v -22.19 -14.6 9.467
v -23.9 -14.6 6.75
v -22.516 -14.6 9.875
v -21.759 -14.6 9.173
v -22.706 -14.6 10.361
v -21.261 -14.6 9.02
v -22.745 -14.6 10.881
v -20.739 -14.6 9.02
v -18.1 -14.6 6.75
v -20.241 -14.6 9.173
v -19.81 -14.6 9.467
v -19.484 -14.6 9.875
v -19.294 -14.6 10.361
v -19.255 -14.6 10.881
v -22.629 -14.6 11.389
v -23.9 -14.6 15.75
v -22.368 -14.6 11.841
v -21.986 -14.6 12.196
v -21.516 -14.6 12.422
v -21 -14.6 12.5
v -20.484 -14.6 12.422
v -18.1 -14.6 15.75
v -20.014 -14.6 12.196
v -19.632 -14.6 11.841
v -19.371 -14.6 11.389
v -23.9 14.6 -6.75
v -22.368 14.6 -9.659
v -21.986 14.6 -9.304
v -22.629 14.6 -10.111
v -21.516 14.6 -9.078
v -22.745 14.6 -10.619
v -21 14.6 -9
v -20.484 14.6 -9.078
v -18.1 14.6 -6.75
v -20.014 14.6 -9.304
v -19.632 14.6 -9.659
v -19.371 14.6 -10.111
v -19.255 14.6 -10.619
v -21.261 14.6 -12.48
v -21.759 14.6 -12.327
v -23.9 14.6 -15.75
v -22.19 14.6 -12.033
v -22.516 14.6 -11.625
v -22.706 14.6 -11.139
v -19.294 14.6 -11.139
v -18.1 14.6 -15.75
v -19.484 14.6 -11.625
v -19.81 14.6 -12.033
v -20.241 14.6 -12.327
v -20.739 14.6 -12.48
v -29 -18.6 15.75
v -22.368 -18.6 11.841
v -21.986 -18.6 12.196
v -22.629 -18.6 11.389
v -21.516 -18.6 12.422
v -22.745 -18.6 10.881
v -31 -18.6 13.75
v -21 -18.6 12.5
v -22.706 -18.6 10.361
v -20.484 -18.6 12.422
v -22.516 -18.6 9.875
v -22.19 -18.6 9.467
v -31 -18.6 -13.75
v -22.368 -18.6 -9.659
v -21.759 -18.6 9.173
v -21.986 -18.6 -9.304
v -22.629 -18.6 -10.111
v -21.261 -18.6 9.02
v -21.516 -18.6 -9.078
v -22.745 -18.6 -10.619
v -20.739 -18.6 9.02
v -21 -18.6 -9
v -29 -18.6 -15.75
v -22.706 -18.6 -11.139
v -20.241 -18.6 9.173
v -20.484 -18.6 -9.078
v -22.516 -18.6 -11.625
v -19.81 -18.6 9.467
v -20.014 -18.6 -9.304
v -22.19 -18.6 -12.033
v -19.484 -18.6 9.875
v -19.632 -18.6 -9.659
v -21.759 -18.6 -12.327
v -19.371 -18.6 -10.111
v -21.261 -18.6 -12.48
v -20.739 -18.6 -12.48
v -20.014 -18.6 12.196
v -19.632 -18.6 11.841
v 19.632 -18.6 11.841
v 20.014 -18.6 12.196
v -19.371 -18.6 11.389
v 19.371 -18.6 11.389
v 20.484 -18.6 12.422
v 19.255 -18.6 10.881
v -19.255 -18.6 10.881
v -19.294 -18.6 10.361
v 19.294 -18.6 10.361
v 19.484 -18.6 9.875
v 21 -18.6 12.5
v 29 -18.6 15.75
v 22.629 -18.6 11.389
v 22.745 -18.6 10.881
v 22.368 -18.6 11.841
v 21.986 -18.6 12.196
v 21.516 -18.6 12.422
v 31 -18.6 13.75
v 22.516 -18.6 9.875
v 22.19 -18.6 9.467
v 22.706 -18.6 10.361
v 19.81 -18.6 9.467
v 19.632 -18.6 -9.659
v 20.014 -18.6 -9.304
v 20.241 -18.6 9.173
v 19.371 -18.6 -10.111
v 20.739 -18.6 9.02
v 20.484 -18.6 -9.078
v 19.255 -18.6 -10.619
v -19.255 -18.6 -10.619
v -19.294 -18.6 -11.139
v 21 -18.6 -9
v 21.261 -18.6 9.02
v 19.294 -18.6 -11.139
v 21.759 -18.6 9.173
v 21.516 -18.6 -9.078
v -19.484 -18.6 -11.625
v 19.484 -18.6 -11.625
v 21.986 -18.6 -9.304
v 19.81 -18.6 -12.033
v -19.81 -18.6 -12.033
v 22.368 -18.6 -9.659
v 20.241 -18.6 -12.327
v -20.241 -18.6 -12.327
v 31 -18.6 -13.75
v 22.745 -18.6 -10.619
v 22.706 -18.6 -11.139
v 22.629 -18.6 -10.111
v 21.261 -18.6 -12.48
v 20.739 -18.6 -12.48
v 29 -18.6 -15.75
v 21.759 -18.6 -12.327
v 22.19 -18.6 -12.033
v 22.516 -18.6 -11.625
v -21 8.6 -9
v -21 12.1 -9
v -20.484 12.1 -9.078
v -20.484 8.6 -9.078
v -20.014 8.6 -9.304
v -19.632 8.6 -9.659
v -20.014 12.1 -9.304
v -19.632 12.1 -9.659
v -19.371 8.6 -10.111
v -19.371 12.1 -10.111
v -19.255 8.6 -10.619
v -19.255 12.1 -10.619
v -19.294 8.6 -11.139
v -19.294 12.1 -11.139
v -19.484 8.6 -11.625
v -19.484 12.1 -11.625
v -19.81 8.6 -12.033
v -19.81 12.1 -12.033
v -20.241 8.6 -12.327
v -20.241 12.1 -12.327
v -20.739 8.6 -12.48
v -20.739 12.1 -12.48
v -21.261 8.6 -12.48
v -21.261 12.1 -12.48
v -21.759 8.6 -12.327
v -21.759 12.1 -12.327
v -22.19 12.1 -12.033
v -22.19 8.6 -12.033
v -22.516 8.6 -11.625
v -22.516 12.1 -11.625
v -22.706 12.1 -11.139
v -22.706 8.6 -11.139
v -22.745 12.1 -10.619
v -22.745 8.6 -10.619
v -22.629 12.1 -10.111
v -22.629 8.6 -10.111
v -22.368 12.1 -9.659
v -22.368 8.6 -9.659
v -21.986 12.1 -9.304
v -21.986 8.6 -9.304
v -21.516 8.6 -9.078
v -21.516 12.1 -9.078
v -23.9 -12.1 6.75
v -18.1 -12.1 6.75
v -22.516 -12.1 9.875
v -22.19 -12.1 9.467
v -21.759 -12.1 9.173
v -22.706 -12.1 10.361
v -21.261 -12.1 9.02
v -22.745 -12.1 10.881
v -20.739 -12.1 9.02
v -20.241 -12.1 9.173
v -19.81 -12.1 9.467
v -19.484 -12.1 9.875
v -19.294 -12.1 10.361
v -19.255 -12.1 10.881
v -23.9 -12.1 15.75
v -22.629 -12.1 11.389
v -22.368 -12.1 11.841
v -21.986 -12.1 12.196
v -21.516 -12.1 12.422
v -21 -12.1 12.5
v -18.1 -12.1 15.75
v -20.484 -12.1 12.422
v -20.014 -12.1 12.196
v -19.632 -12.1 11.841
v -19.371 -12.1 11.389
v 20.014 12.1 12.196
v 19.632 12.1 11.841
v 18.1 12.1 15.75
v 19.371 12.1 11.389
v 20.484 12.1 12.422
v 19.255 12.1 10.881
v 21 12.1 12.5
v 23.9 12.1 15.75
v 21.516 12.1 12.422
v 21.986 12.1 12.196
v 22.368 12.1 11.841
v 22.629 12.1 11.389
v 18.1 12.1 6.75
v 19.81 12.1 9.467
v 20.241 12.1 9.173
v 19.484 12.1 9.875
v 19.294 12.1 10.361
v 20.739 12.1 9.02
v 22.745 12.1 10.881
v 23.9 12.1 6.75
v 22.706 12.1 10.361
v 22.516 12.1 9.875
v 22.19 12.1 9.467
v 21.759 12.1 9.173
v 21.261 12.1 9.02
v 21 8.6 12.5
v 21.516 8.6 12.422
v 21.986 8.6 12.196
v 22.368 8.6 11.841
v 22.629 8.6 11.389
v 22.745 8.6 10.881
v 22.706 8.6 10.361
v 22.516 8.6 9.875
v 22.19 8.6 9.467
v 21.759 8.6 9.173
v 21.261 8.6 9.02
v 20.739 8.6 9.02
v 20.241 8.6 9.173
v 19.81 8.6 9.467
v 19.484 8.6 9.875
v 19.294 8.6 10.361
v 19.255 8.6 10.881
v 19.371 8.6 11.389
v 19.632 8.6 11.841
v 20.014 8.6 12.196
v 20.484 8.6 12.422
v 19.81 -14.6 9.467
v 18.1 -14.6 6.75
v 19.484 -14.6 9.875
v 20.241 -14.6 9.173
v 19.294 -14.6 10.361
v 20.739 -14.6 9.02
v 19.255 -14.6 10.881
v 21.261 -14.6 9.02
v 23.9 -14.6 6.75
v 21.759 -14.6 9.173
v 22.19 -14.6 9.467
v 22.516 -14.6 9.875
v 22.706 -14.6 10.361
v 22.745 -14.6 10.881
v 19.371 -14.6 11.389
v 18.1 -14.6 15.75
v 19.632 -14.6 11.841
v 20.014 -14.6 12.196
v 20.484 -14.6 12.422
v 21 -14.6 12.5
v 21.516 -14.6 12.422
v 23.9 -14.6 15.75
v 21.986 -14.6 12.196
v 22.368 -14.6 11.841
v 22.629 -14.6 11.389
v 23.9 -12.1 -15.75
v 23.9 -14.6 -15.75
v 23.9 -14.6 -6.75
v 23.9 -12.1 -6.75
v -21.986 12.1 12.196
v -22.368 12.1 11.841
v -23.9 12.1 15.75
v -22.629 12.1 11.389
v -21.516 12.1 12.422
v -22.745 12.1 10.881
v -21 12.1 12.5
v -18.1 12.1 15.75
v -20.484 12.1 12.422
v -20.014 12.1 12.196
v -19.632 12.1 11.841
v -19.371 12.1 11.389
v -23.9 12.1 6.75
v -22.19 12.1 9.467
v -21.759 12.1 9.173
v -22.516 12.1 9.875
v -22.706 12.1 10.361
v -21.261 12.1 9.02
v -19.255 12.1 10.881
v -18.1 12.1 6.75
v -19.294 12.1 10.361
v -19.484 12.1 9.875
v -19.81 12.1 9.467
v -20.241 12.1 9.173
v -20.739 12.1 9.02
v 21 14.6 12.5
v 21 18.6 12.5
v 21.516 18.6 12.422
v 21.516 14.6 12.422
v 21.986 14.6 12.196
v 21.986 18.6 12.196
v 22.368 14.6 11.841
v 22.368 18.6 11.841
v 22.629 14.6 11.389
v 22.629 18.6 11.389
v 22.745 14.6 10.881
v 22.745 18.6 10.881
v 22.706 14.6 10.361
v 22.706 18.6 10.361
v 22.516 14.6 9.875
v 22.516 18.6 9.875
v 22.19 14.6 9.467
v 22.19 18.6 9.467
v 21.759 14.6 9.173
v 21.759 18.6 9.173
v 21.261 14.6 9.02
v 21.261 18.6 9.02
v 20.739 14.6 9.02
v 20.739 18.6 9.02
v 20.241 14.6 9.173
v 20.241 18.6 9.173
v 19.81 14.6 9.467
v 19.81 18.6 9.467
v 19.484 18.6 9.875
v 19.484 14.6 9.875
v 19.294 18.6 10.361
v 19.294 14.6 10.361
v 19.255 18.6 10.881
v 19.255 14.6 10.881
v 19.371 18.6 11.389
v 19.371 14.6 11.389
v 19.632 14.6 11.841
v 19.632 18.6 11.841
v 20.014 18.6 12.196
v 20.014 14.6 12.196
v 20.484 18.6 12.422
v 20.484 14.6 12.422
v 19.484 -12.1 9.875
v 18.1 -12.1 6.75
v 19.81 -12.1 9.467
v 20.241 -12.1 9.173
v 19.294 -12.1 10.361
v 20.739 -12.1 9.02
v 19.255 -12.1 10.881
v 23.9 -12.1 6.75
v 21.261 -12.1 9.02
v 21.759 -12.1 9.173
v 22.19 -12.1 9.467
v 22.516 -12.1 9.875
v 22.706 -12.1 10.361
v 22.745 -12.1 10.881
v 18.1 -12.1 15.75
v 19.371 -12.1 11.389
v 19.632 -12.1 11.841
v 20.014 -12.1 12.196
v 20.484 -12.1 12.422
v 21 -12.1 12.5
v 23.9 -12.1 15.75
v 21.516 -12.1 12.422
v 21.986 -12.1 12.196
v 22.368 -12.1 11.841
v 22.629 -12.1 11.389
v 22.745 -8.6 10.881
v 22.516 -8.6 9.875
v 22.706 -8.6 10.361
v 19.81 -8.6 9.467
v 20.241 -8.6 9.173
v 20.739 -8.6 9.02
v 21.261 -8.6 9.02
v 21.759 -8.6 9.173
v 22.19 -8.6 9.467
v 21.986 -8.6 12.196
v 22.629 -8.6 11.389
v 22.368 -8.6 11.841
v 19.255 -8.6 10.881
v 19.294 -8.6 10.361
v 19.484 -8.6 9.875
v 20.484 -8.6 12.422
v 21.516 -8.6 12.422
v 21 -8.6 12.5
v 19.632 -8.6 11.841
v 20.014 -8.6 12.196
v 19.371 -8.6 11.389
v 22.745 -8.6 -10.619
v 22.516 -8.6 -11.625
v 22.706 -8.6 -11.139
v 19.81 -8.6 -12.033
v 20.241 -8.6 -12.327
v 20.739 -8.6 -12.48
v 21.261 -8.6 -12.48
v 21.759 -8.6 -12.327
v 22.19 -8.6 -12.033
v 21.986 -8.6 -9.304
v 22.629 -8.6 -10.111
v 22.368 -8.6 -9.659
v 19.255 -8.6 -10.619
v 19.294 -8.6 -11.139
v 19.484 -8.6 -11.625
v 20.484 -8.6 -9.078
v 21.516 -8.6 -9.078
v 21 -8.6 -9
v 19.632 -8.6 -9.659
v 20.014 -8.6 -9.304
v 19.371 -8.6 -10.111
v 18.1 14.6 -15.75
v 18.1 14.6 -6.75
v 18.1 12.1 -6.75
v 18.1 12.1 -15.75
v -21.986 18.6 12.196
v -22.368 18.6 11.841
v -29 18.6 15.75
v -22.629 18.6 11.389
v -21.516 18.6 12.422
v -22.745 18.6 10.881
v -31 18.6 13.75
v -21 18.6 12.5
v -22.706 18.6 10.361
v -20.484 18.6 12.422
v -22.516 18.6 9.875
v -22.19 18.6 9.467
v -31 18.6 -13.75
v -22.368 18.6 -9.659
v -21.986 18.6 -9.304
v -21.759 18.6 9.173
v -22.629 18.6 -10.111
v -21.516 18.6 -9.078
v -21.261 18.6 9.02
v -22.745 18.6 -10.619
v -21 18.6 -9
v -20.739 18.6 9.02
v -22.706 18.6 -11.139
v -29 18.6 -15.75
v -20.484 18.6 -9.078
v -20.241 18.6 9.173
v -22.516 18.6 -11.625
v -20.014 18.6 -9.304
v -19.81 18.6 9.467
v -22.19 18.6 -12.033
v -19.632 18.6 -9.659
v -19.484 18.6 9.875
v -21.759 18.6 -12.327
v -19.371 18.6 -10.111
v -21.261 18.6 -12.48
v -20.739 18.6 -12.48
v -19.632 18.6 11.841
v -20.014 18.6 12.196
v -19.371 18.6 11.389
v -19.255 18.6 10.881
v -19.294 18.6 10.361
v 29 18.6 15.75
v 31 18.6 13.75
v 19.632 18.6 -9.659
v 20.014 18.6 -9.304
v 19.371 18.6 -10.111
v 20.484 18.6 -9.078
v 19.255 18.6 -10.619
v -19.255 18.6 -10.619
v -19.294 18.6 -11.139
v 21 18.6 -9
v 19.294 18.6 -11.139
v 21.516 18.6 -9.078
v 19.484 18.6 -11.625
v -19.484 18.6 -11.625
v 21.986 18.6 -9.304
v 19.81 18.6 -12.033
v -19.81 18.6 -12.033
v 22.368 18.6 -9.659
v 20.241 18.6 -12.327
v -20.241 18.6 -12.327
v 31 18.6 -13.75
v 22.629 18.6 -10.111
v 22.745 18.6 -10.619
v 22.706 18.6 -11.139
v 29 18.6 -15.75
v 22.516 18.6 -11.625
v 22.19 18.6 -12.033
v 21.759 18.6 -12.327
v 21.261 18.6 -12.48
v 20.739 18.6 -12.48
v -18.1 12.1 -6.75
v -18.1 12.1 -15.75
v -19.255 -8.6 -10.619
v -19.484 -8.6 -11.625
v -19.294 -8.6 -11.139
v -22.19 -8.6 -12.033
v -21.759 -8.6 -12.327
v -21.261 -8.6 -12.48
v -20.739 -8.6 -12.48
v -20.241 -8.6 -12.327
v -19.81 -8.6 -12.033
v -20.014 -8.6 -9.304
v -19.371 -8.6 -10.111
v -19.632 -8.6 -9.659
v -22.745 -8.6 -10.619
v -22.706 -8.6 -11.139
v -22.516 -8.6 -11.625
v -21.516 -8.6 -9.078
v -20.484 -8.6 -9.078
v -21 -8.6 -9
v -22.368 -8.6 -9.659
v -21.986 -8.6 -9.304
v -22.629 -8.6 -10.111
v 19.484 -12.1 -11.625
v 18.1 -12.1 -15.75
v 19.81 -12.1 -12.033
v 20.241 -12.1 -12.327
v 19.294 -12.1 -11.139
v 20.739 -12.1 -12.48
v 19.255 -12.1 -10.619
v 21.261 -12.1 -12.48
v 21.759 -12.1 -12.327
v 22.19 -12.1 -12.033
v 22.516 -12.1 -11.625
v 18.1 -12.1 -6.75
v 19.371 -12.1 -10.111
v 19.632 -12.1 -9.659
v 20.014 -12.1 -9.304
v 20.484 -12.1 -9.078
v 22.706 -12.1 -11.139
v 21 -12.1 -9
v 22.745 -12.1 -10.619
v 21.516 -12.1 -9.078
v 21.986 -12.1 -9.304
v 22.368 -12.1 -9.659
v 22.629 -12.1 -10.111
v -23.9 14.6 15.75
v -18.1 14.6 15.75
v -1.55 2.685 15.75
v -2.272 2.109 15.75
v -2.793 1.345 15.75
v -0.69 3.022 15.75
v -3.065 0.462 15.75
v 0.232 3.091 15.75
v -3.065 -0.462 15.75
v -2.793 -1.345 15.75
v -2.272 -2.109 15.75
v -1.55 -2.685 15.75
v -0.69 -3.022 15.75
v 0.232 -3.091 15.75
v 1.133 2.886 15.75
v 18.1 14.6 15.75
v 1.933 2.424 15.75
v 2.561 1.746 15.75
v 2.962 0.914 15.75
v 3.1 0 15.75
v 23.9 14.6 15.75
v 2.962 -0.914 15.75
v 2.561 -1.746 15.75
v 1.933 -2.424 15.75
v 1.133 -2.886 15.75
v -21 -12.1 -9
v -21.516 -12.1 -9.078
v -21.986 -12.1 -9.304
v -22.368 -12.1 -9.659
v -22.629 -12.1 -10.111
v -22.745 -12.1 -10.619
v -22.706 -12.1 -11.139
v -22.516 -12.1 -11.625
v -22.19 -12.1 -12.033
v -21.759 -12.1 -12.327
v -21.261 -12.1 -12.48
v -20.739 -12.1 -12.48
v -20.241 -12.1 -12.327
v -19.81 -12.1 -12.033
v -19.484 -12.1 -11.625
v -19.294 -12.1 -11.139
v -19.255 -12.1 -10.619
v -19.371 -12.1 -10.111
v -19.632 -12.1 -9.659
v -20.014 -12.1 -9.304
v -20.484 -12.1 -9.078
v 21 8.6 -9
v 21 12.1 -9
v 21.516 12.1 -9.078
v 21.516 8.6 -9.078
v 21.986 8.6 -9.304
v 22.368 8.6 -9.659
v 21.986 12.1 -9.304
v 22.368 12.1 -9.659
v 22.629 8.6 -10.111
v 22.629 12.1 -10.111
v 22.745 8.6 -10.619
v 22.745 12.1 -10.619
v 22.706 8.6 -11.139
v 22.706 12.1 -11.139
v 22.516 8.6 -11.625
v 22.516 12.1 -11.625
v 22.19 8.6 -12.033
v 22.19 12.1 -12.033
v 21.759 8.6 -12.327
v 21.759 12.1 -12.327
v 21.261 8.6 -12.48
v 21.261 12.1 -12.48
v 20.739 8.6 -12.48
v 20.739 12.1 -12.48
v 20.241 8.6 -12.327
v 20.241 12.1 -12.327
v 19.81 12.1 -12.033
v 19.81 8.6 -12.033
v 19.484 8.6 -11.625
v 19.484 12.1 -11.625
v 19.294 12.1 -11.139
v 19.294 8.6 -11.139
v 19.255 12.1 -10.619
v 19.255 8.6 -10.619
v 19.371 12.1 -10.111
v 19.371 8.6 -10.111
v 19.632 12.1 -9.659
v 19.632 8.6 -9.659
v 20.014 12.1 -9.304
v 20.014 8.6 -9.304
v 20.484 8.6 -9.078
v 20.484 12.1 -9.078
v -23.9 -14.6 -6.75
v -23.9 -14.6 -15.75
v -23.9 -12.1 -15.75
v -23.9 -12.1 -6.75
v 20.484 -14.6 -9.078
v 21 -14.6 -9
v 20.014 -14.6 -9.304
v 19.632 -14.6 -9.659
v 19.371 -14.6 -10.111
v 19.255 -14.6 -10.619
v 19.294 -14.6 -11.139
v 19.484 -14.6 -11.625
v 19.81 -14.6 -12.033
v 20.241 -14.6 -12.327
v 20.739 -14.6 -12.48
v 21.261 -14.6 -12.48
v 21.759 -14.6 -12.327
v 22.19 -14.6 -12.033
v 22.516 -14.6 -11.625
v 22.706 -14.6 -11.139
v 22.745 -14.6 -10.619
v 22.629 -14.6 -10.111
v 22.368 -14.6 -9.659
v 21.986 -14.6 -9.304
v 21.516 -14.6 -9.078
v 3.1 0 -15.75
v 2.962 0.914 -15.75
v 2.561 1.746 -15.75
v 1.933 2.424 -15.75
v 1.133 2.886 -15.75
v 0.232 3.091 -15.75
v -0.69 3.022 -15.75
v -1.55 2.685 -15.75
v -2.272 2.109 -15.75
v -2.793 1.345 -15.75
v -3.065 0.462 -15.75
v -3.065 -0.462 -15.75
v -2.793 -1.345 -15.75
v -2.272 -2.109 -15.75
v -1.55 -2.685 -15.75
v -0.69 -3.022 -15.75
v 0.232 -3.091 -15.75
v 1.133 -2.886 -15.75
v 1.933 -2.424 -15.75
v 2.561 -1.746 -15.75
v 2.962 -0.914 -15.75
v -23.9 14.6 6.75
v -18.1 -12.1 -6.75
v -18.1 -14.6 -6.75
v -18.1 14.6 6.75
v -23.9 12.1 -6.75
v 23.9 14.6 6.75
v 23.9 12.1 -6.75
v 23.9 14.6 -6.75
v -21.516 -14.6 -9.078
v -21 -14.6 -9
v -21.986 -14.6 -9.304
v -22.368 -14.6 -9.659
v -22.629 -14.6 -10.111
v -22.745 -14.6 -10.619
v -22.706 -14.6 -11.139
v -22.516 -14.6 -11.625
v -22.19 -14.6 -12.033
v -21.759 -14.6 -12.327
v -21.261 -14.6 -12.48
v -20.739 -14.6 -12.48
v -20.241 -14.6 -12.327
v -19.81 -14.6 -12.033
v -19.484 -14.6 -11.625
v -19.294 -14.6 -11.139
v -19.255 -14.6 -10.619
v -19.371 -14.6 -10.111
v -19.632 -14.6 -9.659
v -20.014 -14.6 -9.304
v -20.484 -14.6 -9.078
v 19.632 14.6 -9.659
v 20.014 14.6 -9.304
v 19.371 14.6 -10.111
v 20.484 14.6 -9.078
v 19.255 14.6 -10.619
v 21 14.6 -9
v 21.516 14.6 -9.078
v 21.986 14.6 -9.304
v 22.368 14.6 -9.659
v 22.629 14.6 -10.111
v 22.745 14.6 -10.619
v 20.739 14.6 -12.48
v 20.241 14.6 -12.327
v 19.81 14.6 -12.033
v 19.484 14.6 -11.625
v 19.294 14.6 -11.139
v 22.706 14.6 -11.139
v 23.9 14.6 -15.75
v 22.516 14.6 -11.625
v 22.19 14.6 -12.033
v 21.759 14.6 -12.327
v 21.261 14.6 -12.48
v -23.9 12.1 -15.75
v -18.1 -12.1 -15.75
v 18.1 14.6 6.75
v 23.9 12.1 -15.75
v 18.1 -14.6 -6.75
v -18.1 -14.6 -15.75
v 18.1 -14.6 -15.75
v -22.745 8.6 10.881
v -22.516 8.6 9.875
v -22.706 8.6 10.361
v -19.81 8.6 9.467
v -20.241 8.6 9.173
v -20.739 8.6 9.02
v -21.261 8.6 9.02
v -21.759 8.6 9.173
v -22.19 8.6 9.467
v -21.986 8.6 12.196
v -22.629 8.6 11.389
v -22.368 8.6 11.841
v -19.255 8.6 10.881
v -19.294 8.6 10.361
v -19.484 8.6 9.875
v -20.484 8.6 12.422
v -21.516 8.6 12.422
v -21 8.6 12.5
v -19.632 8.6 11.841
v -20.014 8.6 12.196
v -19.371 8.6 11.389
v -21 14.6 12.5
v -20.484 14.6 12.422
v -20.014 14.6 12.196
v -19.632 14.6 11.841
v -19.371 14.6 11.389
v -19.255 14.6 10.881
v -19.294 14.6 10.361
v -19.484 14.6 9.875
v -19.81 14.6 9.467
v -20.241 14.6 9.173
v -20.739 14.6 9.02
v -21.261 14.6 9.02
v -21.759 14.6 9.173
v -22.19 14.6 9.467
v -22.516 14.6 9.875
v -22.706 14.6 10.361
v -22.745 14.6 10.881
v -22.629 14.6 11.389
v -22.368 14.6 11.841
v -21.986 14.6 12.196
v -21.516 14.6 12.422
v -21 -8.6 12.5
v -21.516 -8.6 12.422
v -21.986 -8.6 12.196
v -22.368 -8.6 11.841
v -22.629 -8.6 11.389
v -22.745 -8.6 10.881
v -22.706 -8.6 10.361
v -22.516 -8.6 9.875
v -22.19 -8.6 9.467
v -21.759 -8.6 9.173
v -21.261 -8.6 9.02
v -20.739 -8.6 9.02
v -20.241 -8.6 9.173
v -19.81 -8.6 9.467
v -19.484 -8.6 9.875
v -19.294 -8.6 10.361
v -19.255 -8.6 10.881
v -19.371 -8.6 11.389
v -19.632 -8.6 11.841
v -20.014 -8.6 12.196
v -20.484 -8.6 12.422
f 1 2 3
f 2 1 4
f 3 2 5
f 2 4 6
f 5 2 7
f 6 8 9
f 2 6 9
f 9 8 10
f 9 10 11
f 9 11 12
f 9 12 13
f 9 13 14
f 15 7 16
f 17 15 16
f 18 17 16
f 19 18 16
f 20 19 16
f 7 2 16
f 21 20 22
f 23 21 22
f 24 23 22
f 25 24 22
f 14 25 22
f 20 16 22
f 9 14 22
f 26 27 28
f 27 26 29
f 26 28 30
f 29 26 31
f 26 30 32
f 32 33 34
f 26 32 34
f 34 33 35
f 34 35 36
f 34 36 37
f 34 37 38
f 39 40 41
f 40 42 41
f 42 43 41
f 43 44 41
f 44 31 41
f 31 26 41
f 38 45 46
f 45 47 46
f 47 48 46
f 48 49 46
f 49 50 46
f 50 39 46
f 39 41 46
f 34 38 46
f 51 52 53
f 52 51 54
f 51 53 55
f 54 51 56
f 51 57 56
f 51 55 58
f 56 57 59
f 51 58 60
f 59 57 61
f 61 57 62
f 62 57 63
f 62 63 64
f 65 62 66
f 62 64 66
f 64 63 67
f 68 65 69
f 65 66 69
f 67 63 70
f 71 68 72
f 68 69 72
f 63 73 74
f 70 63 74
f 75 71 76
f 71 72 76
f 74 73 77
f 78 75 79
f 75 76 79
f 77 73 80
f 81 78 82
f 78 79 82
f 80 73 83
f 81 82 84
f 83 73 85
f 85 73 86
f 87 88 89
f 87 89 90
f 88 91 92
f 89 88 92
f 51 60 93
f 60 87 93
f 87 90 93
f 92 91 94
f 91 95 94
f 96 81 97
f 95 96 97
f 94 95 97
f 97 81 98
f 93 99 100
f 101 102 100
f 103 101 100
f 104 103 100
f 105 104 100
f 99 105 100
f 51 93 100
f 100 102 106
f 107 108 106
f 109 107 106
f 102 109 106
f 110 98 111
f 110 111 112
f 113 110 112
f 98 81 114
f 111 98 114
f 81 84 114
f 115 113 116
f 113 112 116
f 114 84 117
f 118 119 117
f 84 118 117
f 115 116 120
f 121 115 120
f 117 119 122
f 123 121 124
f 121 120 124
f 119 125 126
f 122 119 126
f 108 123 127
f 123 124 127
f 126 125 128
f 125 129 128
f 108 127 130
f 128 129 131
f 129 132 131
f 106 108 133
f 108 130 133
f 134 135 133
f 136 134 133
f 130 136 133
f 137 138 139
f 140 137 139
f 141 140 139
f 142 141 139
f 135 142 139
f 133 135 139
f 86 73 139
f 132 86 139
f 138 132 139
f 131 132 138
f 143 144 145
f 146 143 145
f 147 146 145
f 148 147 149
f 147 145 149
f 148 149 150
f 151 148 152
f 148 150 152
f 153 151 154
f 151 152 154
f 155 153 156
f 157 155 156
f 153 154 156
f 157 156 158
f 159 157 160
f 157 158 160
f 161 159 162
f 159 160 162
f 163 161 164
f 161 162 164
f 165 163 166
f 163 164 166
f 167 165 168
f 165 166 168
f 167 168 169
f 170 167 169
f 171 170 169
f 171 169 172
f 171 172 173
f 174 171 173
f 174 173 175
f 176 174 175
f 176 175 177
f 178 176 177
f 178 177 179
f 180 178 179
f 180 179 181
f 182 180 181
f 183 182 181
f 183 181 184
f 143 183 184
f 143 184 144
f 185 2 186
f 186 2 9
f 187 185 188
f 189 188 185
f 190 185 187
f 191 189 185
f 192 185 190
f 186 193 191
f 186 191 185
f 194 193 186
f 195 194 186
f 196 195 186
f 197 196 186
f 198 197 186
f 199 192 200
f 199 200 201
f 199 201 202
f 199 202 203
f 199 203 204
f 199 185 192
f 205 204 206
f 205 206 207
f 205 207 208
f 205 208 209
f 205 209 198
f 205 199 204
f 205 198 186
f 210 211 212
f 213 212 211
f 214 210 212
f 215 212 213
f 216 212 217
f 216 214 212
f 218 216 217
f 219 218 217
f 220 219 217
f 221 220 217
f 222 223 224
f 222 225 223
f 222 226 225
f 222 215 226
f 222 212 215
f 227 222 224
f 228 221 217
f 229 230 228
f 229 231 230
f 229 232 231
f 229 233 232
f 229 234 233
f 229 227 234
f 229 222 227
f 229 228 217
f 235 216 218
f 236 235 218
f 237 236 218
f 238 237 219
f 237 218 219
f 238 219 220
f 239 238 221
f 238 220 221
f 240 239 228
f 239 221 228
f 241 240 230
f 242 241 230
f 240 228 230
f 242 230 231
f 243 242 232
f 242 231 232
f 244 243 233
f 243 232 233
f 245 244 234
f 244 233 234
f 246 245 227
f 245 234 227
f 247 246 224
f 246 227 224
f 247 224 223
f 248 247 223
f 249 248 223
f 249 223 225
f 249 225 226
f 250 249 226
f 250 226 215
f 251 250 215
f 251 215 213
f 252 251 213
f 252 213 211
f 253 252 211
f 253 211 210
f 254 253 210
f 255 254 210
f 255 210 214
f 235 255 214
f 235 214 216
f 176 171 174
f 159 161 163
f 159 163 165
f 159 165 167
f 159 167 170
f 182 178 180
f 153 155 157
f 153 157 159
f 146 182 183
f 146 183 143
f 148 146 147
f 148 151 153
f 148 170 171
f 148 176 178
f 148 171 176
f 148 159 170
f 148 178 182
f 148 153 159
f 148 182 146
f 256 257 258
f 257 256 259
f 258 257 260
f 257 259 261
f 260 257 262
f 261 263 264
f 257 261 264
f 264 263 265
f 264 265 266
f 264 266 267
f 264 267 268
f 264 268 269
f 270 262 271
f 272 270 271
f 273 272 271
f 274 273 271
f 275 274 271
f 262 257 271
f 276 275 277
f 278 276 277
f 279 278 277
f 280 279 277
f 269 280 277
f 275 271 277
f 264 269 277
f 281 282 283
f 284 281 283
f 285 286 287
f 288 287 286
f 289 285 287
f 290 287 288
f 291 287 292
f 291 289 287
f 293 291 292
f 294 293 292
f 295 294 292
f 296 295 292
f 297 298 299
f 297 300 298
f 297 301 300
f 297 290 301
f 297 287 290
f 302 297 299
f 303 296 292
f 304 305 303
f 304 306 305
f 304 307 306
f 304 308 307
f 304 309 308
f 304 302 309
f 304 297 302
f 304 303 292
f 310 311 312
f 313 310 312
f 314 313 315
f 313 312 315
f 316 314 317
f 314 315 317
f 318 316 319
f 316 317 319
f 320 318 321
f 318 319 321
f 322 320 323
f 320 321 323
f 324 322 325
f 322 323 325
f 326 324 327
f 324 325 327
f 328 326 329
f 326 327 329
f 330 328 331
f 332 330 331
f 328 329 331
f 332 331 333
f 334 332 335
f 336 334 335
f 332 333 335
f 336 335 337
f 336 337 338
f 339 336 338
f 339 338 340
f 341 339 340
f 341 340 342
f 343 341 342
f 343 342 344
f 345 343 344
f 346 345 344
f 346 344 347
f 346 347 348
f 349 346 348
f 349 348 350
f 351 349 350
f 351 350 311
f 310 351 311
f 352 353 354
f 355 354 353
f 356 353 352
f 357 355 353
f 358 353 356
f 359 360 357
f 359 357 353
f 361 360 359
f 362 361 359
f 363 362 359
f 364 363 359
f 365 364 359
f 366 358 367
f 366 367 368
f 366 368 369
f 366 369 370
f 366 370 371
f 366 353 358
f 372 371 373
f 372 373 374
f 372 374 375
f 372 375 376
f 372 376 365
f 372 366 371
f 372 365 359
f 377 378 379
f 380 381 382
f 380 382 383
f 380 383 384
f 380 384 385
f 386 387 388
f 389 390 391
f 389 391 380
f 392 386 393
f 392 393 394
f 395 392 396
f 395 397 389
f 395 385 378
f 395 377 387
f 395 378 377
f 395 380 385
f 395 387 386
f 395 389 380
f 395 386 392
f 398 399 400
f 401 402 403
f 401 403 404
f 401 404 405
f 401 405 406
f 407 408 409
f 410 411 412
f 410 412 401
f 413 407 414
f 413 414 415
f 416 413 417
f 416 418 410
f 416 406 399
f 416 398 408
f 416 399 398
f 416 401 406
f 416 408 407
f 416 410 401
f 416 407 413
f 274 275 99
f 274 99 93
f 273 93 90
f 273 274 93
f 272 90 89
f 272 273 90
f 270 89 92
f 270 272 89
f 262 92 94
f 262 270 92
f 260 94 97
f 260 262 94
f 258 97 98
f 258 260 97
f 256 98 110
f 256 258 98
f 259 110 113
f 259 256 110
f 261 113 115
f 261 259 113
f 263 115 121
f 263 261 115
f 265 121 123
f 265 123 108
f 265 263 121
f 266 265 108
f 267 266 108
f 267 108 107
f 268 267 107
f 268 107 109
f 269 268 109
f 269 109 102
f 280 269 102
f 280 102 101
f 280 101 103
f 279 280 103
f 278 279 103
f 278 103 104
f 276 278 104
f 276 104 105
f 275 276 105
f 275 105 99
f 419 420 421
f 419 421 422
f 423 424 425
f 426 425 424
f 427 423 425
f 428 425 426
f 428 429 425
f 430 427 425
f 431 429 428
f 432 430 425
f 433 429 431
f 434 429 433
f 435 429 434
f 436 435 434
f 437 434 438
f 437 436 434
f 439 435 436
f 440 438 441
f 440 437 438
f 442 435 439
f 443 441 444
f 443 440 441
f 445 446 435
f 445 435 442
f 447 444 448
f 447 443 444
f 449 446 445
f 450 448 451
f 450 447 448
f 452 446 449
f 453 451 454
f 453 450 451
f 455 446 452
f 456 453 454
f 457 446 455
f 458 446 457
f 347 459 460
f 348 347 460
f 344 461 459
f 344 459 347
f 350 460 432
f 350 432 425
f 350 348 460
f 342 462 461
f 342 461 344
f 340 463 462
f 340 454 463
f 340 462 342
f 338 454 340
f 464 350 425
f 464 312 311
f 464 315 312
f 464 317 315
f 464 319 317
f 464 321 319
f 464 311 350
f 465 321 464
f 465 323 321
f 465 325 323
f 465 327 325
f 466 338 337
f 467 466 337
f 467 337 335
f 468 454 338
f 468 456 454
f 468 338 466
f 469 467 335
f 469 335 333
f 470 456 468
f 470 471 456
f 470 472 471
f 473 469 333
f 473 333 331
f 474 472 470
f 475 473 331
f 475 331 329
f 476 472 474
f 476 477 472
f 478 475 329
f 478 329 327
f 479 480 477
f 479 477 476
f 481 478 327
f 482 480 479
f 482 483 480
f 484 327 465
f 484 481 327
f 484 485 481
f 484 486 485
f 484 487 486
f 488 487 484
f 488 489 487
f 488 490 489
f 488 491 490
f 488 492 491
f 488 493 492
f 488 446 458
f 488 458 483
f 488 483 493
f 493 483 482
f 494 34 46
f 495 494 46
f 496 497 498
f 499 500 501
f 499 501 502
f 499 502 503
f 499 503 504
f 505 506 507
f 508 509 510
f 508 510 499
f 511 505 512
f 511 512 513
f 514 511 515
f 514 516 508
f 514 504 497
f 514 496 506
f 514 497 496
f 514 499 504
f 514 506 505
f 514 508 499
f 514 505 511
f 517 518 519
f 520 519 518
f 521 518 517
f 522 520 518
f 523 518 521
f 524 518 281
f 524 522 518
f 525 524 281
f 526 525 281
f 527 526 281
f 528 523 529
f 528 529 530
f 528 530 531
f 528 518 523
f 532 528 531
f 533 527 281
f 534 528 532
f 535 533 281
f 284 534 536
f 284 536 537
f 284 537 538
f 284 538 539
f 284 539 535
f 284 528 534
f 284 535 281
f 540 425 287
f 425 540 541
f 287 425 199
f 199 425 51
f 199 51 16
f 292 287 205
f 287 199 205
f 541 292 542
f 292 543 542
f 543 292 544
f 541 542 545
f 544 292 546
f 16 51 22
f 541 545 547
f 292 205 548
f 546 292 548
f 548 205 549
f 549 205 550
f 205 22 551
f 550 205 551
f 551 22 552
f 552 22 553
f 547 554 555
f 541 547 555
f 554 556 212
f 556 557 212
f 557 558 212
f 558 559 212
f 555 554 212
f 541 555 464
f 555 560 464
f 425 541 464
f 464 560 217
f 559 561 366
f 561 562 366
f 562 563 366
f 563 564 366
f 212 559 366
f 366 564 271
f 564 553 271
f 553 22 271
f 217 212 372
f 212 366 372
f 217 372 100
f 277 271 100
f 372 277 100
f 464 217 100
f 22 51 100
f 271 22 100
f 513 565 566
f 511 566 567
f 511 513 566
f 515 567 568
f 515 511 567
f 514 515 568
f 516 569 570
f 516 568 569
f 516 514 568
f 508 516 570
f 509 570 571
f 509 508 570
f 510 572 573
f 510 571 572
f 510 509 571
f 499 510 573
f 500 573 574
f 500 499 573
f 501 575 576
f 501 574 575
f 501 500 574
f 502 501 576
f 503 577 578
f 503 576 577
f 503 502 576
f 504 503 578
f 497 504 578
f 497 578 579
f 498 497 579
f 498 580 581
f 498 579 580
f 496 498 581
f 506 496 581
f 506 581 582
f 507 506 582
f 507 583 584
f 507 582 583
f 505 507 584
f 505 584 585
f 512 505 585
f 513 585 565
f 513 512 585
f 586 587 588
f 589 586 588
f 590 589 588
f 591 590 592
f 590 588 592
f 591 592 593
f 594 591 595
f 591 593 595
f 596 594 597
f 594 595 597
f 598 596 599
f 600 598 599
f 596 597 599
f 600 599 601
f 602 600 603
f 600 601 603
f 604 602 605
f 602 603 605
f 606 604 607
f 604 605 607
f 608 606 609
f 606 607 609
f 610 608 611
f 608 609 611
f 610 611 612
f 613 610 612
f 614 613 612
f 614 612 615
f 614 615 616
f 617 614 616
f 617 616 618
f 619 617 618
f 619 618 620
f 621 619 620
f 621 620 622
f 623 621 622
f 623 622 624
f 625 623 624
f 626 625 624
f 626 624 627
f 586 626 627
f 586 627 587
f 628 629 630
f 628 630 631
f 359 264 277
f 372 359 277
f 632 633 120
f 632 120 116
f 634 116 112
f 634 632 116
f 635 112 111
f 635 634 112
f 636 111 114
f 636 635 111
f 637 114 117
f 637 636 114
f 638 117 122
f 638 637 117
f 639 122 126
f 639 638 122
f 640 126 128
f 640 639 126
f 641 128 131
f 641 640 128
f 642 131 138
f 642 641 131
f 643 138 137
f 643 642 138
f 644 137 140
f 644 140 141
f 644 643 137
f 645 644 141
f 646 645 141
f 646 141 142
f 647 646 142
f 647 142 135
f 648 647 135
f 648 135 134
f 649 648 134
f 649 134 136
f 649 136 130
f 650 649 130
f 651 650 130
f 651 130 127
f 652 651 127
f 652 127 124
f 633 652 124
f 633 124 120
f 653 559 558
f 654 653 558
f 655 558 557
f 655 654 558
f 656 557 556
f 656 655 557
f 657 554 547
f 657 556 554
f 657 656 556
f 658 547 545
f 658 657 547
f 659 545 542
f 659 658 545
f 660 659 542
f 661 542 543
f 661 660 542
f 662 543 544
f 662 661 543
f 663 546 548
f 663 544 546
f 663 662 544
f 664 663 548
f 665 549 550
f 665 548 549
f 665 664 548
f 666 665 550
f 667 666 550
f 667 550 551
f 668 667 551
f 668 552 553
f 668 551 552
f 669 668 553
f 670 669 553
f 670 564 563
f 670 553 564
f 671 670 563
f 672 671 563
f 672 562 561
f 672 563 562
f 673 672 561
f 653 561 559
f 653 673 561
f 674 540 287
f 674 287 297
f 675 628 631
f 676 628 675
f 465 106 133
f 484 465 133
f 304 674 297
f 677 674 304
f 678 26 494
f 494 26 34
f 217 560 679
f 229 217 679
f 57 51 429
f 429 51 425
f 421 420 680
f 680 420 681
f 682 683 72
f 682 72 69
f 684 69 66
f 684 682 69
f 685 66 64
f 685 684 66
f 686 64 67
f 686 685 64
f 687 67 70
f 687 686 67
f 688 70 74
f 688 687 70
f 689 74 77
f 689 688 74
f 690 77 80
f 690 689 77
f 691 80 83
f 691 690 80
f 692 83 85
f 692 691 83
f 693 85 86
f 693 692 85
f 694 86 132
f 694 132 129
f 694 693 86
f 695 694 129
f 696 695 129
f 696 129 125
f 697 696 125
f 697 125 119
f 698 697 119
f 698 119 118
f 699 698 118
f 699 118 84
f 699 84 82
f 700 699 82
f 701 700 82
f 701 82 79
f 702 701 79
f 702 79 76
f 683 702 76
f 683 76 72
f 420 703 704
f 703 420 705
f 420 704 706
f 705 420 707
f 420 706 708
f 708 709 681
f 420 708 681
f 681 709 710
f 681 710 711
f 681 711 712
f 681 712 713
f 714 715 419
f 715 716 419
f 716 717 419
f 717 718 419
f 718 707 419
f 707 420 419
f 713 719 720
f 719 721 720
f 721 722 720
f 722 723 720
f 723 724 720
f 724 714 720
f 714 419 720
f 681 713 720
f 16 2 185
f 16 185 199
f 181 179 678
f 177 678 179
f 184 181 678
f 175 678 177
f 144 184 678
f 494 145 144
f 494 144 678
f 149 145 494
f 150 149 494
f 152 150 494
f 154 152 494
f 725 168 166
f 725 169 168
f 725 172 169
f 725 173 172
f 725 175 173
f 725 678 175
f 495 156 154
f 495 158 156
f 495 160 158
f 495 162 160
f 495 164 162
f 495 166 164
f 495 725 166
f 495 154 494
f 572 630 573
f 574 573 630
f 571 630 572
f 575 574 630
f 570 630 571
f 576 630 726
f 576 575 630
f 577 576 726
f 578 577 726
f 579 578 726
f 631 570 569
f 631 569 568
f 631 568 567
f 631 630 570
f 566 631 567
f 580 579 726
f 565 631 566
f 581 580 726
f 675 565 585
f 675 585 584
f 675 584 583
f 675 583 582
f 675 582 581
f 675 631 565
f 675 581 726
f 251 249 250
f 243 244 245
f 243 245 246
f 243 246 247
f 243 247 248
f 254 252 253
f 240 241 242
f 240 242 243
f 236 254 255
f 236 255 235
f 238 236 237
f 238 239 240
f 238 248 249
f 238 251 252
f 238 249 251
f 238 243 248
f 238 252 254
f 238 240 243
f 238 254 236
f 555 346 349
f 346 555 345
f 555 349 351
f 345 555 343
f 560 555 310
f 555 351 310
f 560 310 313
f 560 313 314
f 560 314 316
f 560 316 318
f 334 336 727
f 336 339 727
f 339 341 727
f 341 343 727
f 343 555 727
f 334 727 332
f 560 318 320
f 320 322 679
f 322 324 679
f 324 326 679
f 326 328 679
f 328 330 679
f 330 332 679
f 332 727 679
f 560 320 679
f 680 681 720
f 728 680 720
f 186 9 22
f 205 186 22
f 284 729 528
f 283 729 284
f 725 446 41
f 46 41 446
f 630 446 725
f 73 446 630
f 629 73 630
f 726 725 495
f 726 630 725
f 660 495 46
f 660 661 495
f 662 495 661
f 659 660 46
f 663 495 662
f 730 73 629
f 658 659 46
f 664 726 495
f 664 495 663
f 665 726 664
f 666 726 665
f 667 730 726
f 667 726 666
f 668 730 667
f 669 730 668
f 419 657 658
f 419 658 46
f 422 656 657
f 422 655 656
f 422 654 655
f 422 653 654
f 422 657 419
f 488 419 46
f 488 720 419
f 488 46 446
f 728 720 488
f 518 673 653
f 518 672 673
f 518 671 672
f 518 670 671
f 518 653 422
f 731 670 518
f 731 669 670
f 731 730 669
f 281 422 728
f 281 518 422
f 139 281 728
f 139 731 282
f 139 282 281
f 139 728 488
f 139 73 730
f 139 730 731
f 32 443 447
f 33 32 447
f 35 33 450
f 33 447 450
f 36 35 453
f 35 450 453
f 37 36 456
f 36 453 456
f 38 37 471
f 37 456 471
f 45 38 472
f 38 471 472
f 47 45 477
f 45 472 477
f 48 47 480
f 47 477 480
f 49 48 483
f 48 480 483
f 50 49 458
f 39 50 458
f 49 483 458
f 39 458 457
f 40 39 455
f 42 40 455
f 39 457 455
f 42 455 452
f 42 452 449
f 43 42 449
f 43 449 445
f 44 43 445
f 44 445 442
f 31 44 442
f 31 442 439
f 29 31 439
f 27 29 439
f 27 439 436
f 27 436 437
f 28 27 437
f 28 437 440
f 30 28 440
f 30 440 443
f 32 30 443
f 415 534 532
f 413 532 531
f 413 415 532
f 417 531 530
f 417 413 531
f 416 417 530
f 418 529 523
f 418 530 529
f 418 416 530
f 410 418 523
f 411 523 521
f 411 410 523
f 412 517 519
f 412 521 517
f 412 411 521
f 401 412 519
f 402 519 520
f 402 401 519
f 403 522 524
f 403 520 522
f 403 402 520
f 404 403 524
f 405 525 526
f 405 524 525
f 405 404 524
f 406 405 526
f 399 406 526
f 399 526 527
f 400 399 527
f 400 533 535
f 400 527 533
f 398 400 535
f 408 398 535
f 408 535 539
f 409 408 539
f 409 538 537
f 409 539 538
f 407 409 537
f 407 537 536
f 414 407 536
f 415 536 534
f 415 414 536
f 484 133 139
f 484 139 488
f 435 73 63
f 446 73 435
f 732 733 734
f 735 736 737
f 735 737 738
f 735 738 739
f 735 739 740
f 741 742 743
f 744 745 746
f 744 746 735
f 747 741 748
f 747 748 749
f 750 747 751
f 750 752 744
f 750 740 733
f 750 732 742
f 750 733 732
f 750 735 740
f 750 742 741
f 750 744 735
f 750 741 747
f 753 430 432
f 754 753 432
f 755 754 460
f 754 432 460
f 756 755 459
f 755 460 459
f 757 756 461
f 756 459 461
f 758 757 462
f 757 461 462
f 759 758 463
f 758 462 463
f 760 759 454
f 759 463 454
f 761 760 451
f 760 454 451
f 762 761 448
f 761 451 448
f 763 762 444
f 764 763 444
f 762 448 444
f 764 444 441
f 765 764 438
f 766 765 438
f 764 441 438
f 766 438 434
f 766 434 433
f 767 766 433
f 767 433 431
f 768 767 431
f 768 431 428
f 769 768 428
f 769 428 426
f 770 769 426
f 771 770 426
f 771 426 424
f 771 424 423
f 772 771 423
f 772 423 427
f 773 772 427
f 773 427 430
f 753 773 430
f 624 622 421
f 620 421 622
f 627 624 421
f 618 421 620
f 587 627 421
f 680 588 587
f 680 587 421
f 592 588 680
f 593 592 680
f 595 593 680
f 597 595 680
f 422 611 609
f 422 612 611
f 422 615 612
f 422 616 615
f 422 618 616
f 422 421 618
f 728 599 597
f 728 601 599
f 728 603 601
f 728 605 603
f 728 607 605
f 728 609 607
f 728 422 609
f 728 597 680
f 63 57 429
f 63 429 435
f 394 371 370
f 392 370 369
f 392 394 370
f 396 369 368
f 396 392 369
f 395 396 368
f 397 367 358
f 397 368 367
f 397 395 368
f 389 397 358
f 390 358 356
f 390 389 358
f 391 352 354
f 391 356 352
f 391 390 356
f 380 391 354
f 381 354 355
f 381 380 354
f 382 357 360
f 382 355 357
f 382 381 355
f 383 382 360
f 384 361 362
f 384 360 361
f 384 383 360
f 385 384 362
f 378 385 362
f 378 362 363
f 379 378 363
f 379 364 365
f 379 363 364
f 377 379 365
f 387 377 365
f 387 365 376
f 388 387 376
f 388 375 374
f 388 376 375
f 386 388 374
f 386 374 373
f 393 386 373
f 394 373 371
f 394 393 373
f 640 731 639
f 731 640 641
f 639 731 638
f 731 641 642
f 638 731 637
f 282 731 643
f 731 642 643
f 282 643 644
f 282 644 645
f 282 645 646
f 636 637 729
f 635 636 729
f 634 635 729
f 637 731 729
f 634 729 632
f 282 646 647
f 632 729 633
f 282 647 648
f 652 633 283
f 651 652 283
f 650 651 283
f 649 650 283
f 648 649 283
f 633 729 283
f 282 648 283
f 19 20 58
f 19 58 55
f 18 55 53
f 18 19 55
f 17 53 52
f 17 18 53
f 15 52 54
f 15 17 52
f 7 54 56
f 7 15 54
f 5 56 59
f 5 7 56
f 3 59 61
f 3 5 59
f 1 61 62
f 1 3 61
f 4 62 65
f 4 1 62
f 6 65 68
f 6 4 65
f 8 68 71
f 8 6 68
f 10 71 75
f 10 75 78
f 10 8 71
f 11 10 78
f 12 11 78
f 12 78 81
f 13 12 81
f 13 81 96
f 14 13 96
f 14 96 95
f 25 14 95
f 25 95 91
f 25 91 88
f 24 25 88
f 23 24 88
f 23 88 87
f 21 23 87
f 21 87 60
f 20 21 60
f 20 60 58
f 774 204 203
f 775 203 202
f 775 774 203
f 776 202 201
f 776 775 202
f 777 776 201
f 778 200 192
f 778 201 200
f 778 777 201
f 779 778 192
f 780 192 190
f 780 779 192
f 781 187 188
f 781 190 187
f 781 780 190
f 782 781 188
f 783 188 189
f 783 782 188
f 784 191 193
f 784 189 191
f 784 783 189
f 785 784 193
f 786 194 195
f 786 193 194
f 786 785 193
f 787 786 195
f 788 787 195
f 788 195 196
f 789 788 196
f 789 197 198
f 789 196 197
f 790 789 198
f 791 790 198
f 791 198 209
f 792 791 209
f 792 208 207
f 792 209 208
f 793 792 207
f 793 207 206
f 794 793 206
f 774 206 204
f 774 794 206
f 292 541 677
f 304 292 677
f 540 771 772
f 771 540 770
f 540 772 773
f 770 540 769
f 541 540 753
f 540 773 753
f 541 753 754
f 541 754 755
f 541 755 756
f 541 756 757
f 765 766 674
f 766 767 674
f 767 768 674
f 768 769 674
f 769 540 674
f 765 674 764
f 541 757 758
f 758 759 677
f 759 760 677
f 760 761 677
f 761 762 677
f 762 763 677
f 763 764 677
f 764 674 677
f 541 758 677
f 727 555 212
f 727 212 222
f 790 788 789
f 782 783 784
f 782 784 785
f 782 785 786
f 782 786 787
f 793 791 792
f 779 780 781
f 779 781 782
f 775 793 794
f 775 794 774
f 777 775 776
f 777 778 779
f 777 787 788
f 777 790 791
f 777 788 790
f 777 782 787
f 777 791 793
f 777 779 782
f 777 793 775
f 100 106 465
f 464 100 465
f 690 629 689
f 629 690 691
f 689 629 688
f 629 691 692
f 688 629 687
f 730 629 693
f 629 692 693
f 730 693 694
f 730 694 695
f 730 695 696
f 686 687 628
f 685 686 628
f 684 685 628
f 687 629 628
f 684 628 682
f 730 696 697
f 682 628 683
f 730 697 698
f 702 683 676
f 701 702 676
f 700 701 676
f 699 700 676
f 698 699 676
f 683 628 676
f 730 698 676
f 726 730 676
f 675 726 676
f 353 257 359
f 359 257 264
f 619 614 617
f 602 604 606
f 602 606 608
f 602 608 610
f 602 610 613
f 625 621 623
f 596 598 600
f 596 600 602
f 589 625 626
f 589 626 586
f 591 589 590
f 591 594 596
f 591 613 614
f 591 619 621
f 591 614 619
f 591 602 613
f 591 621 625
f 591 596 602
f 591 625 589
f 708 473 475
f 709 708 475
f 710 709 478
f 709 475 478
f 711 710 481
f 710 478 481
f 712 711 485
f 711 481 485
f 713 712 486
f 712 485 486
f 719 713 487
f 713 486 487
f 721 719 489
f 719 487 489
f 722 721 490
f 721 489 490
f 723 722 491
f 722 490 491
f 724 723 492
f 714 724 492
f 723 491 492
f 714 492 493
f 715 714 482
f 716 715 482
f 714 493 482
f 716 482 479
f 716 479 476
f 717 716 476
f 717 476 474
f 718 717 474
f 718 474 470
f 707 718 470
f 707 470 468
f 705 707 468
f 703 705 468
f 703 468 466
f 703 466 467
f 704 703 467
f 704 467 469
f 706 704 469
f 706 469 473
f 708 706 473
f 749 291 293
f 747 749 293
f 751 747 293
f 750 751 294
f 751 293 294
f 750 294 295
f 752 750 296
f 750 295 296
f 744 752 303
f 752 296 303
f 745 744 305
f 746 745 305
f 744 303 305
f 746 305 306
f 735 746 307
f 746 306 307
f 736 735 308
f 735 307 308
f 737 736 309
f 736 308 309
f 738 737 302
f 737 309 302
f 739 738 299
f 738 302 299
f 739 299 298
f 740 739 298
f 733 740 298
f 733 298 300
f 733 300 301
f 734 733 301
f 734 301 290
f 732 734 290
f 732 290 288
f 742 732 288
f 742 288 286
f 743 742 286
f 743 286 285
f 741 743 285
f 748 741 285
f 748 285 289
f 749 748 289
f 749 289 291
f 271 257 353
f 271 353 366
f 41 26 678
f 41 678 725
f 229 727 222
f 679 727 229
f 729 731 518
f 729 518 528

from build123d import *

# Parameters (mm, degrees)
BOSS_EXTRUDE1_DEPTH      = 18.6
BOSS_EXTRUDE1_DEPTH_BACK = 18.6
SKETCH2_W                = 62
SKETCH2_H                = 31.5
CUT_EXTRUDE1_DEPTH       = 40.433773596
CUT_EXTRUDE1_DEPTH_BACK  = 40.433773596
SKETCH3_R                = 3.1
SKETCH5_R                = 1.75
CUT_EXTRUDE2_DEPTH       = 10
CUT_EXTRUDE3_START       = -10
SKETCH6_R                = 1.75
CUT_EXTRUDE3_DEPTH       = 10
CUT_EXTRUDE4_START       = -4
SKETCH7_W                = 5.8
SKETCH7_H                = 9
CUT_EXTRUDE4_DEPTH       = 2.5
CUT_EXTRUDE5_START       = -4
SKETCH8_W                = 5.8
SKETCH8_H                = 9
CUT_EXTRUDE5_DEPTH       = 2.5
CHAMFER1_SIZE            = 2


with BuildPart() as part:
    # Sketch2 → Boss-Extrude1 (new, two sides: drawn at the far end of the back side and taken through both)
    with BuildSketch(Plane(origin=(0, 0, 0), x_dir=(1, 0, 0), z_dir=(0, 1, 0)).offset(-BOSS_EXTRUDE1_DEPTH_BACK)):
        Rectangle(SKETCH2_W, SKETCH2_H)
    extrude(amount=BOSS_EXTRUDE1_DEPTH + BOSS_EXTRUDE1_DEPTH_BACK)

    # Sketch3 → Cut-Extrude1 (cut, two sides: drawn at the far end of the back side and taken through both)
    with BuildSketch(Plane.XY.offset(-CUT_EXTRUDE1_DEPTH_BACK)):
        Circle(SKETCH3_R)
    extrude(amount=CUT_EXTRUDE1_DEPTH + CUT_EXTRUDE1_DEPTH_BACK, mode=Mode.SUBTRACT)

    # Sketch5 → Cut-Extrude2 (cut)
    with BuildSketch(Plane(origin=(0, 18.6, 0), x_dir=(1, 0, 0), z_dir=(0, 1, 0))):
        with Locations(Location((-21, -10.75, 0), (0, 0, 270))):
            Circle(SKETCH5_R)
        with Locations(Location((21, -10.75, 0), (0, 0, 270))):
            Circle(SKETCH5_R)
        with Locations(Location((21, 10.75, 0), (0, 0, 270))):
            Circle(SKETCH5_R)
        with Locations(Location((-21, 10.75, 0), (0, 0, 270))):
            Circle(SKETCH5_R)
    extrude(amount=-CUT_EXTRUDE2_DEPTH, mode=Mode.SUBTRACT)

    # Sketch6 → Cut-Extrude3 (cut)
    with BuildSketch(Plane.XZ.offset(18.6).offset(CUT_EXTRUDE3_START)):
        with Locations(Location((-21, 10.75, 0), (0, 0, 90))):
            Circle(SKETCH6_R)
        with Locations(Location((21, 10.75, 0), (0, 0, 90))):
            Circle(SKETCH6_R)
        with Locations(Location((21, -10.75, 0), (0, 0, 90))):
            Circle(SKETCH6_R)
        with Locations(Location((-21, -10.75, 0), (0, 0, 90))):
            Circle(SKETCH6_R)
    extrude(amount=CUT_EXTRUDE3_DEPTH, mode=Mode.SUBTRACT)

    # Sketch7 → Cut-Extrude4 (cut)
    with BuildSketch(Plane(origin=(0, 18.6, 0), x_dir=(1, 0, 0), z_dir=(0, 1, 0)).offset(CUT_EXTRUDE4_START)):
        with Locations((-21, 11.25)):
            Rectangle(SKETCH7_W, SKETCH7_H)
        with Locations((21, 11.25)):
            Rectangle(SKETCH7_W, SKETCH7_H)
        with Locations((21, -11.25)):
            Rectangle(SKETCH7_W, SKETCH7_H)
        with Locations((-21, -11.25)):
            Rectangle(SKETCH7_W, SKETCH7_H)
    extrude(amount=-CUT_EXTRUDE4_DEPTH, mode=Mode.SUBTRACT)

    # Sketch8 → Cut-Extrude5 (cut)
    with BuildSketch(Plane.XZ.offset(18.6).offset(CUT_EXTRUDE5_START)):
        with Locations((-21, -11.25)):
            Rectangle(SKETCH8_W, SKETCH8_H)
        with Locations((-21, 11.25)):
            Rectangle(SKETCH8_W, SKETCH8_H)
        with Locations((21, 11.25)):
            Rectangle(SKETCH8_W, SKETCH8_H)
        with Locations((21, -11.25)):
            Rectangle(SKETCH8_W, SKETCH8_H)
    extrude(amount=-CUT_EXTRUDE5_DEPTH, mode=Mode.SUBTRACT)

    # Chamfer1
    chamfer1_edges = [part.edges().sort_by_distance(p)[0] for p in [
        (31, 0, 15.75),
        (31, 0, -15.75),
        (-31, 0, -15.75),
        (-31, 0, 15.75),
    ]]
    chamfer(chamfer1_edges, length=CHAMFER1_SIZE)


solid = part.part
